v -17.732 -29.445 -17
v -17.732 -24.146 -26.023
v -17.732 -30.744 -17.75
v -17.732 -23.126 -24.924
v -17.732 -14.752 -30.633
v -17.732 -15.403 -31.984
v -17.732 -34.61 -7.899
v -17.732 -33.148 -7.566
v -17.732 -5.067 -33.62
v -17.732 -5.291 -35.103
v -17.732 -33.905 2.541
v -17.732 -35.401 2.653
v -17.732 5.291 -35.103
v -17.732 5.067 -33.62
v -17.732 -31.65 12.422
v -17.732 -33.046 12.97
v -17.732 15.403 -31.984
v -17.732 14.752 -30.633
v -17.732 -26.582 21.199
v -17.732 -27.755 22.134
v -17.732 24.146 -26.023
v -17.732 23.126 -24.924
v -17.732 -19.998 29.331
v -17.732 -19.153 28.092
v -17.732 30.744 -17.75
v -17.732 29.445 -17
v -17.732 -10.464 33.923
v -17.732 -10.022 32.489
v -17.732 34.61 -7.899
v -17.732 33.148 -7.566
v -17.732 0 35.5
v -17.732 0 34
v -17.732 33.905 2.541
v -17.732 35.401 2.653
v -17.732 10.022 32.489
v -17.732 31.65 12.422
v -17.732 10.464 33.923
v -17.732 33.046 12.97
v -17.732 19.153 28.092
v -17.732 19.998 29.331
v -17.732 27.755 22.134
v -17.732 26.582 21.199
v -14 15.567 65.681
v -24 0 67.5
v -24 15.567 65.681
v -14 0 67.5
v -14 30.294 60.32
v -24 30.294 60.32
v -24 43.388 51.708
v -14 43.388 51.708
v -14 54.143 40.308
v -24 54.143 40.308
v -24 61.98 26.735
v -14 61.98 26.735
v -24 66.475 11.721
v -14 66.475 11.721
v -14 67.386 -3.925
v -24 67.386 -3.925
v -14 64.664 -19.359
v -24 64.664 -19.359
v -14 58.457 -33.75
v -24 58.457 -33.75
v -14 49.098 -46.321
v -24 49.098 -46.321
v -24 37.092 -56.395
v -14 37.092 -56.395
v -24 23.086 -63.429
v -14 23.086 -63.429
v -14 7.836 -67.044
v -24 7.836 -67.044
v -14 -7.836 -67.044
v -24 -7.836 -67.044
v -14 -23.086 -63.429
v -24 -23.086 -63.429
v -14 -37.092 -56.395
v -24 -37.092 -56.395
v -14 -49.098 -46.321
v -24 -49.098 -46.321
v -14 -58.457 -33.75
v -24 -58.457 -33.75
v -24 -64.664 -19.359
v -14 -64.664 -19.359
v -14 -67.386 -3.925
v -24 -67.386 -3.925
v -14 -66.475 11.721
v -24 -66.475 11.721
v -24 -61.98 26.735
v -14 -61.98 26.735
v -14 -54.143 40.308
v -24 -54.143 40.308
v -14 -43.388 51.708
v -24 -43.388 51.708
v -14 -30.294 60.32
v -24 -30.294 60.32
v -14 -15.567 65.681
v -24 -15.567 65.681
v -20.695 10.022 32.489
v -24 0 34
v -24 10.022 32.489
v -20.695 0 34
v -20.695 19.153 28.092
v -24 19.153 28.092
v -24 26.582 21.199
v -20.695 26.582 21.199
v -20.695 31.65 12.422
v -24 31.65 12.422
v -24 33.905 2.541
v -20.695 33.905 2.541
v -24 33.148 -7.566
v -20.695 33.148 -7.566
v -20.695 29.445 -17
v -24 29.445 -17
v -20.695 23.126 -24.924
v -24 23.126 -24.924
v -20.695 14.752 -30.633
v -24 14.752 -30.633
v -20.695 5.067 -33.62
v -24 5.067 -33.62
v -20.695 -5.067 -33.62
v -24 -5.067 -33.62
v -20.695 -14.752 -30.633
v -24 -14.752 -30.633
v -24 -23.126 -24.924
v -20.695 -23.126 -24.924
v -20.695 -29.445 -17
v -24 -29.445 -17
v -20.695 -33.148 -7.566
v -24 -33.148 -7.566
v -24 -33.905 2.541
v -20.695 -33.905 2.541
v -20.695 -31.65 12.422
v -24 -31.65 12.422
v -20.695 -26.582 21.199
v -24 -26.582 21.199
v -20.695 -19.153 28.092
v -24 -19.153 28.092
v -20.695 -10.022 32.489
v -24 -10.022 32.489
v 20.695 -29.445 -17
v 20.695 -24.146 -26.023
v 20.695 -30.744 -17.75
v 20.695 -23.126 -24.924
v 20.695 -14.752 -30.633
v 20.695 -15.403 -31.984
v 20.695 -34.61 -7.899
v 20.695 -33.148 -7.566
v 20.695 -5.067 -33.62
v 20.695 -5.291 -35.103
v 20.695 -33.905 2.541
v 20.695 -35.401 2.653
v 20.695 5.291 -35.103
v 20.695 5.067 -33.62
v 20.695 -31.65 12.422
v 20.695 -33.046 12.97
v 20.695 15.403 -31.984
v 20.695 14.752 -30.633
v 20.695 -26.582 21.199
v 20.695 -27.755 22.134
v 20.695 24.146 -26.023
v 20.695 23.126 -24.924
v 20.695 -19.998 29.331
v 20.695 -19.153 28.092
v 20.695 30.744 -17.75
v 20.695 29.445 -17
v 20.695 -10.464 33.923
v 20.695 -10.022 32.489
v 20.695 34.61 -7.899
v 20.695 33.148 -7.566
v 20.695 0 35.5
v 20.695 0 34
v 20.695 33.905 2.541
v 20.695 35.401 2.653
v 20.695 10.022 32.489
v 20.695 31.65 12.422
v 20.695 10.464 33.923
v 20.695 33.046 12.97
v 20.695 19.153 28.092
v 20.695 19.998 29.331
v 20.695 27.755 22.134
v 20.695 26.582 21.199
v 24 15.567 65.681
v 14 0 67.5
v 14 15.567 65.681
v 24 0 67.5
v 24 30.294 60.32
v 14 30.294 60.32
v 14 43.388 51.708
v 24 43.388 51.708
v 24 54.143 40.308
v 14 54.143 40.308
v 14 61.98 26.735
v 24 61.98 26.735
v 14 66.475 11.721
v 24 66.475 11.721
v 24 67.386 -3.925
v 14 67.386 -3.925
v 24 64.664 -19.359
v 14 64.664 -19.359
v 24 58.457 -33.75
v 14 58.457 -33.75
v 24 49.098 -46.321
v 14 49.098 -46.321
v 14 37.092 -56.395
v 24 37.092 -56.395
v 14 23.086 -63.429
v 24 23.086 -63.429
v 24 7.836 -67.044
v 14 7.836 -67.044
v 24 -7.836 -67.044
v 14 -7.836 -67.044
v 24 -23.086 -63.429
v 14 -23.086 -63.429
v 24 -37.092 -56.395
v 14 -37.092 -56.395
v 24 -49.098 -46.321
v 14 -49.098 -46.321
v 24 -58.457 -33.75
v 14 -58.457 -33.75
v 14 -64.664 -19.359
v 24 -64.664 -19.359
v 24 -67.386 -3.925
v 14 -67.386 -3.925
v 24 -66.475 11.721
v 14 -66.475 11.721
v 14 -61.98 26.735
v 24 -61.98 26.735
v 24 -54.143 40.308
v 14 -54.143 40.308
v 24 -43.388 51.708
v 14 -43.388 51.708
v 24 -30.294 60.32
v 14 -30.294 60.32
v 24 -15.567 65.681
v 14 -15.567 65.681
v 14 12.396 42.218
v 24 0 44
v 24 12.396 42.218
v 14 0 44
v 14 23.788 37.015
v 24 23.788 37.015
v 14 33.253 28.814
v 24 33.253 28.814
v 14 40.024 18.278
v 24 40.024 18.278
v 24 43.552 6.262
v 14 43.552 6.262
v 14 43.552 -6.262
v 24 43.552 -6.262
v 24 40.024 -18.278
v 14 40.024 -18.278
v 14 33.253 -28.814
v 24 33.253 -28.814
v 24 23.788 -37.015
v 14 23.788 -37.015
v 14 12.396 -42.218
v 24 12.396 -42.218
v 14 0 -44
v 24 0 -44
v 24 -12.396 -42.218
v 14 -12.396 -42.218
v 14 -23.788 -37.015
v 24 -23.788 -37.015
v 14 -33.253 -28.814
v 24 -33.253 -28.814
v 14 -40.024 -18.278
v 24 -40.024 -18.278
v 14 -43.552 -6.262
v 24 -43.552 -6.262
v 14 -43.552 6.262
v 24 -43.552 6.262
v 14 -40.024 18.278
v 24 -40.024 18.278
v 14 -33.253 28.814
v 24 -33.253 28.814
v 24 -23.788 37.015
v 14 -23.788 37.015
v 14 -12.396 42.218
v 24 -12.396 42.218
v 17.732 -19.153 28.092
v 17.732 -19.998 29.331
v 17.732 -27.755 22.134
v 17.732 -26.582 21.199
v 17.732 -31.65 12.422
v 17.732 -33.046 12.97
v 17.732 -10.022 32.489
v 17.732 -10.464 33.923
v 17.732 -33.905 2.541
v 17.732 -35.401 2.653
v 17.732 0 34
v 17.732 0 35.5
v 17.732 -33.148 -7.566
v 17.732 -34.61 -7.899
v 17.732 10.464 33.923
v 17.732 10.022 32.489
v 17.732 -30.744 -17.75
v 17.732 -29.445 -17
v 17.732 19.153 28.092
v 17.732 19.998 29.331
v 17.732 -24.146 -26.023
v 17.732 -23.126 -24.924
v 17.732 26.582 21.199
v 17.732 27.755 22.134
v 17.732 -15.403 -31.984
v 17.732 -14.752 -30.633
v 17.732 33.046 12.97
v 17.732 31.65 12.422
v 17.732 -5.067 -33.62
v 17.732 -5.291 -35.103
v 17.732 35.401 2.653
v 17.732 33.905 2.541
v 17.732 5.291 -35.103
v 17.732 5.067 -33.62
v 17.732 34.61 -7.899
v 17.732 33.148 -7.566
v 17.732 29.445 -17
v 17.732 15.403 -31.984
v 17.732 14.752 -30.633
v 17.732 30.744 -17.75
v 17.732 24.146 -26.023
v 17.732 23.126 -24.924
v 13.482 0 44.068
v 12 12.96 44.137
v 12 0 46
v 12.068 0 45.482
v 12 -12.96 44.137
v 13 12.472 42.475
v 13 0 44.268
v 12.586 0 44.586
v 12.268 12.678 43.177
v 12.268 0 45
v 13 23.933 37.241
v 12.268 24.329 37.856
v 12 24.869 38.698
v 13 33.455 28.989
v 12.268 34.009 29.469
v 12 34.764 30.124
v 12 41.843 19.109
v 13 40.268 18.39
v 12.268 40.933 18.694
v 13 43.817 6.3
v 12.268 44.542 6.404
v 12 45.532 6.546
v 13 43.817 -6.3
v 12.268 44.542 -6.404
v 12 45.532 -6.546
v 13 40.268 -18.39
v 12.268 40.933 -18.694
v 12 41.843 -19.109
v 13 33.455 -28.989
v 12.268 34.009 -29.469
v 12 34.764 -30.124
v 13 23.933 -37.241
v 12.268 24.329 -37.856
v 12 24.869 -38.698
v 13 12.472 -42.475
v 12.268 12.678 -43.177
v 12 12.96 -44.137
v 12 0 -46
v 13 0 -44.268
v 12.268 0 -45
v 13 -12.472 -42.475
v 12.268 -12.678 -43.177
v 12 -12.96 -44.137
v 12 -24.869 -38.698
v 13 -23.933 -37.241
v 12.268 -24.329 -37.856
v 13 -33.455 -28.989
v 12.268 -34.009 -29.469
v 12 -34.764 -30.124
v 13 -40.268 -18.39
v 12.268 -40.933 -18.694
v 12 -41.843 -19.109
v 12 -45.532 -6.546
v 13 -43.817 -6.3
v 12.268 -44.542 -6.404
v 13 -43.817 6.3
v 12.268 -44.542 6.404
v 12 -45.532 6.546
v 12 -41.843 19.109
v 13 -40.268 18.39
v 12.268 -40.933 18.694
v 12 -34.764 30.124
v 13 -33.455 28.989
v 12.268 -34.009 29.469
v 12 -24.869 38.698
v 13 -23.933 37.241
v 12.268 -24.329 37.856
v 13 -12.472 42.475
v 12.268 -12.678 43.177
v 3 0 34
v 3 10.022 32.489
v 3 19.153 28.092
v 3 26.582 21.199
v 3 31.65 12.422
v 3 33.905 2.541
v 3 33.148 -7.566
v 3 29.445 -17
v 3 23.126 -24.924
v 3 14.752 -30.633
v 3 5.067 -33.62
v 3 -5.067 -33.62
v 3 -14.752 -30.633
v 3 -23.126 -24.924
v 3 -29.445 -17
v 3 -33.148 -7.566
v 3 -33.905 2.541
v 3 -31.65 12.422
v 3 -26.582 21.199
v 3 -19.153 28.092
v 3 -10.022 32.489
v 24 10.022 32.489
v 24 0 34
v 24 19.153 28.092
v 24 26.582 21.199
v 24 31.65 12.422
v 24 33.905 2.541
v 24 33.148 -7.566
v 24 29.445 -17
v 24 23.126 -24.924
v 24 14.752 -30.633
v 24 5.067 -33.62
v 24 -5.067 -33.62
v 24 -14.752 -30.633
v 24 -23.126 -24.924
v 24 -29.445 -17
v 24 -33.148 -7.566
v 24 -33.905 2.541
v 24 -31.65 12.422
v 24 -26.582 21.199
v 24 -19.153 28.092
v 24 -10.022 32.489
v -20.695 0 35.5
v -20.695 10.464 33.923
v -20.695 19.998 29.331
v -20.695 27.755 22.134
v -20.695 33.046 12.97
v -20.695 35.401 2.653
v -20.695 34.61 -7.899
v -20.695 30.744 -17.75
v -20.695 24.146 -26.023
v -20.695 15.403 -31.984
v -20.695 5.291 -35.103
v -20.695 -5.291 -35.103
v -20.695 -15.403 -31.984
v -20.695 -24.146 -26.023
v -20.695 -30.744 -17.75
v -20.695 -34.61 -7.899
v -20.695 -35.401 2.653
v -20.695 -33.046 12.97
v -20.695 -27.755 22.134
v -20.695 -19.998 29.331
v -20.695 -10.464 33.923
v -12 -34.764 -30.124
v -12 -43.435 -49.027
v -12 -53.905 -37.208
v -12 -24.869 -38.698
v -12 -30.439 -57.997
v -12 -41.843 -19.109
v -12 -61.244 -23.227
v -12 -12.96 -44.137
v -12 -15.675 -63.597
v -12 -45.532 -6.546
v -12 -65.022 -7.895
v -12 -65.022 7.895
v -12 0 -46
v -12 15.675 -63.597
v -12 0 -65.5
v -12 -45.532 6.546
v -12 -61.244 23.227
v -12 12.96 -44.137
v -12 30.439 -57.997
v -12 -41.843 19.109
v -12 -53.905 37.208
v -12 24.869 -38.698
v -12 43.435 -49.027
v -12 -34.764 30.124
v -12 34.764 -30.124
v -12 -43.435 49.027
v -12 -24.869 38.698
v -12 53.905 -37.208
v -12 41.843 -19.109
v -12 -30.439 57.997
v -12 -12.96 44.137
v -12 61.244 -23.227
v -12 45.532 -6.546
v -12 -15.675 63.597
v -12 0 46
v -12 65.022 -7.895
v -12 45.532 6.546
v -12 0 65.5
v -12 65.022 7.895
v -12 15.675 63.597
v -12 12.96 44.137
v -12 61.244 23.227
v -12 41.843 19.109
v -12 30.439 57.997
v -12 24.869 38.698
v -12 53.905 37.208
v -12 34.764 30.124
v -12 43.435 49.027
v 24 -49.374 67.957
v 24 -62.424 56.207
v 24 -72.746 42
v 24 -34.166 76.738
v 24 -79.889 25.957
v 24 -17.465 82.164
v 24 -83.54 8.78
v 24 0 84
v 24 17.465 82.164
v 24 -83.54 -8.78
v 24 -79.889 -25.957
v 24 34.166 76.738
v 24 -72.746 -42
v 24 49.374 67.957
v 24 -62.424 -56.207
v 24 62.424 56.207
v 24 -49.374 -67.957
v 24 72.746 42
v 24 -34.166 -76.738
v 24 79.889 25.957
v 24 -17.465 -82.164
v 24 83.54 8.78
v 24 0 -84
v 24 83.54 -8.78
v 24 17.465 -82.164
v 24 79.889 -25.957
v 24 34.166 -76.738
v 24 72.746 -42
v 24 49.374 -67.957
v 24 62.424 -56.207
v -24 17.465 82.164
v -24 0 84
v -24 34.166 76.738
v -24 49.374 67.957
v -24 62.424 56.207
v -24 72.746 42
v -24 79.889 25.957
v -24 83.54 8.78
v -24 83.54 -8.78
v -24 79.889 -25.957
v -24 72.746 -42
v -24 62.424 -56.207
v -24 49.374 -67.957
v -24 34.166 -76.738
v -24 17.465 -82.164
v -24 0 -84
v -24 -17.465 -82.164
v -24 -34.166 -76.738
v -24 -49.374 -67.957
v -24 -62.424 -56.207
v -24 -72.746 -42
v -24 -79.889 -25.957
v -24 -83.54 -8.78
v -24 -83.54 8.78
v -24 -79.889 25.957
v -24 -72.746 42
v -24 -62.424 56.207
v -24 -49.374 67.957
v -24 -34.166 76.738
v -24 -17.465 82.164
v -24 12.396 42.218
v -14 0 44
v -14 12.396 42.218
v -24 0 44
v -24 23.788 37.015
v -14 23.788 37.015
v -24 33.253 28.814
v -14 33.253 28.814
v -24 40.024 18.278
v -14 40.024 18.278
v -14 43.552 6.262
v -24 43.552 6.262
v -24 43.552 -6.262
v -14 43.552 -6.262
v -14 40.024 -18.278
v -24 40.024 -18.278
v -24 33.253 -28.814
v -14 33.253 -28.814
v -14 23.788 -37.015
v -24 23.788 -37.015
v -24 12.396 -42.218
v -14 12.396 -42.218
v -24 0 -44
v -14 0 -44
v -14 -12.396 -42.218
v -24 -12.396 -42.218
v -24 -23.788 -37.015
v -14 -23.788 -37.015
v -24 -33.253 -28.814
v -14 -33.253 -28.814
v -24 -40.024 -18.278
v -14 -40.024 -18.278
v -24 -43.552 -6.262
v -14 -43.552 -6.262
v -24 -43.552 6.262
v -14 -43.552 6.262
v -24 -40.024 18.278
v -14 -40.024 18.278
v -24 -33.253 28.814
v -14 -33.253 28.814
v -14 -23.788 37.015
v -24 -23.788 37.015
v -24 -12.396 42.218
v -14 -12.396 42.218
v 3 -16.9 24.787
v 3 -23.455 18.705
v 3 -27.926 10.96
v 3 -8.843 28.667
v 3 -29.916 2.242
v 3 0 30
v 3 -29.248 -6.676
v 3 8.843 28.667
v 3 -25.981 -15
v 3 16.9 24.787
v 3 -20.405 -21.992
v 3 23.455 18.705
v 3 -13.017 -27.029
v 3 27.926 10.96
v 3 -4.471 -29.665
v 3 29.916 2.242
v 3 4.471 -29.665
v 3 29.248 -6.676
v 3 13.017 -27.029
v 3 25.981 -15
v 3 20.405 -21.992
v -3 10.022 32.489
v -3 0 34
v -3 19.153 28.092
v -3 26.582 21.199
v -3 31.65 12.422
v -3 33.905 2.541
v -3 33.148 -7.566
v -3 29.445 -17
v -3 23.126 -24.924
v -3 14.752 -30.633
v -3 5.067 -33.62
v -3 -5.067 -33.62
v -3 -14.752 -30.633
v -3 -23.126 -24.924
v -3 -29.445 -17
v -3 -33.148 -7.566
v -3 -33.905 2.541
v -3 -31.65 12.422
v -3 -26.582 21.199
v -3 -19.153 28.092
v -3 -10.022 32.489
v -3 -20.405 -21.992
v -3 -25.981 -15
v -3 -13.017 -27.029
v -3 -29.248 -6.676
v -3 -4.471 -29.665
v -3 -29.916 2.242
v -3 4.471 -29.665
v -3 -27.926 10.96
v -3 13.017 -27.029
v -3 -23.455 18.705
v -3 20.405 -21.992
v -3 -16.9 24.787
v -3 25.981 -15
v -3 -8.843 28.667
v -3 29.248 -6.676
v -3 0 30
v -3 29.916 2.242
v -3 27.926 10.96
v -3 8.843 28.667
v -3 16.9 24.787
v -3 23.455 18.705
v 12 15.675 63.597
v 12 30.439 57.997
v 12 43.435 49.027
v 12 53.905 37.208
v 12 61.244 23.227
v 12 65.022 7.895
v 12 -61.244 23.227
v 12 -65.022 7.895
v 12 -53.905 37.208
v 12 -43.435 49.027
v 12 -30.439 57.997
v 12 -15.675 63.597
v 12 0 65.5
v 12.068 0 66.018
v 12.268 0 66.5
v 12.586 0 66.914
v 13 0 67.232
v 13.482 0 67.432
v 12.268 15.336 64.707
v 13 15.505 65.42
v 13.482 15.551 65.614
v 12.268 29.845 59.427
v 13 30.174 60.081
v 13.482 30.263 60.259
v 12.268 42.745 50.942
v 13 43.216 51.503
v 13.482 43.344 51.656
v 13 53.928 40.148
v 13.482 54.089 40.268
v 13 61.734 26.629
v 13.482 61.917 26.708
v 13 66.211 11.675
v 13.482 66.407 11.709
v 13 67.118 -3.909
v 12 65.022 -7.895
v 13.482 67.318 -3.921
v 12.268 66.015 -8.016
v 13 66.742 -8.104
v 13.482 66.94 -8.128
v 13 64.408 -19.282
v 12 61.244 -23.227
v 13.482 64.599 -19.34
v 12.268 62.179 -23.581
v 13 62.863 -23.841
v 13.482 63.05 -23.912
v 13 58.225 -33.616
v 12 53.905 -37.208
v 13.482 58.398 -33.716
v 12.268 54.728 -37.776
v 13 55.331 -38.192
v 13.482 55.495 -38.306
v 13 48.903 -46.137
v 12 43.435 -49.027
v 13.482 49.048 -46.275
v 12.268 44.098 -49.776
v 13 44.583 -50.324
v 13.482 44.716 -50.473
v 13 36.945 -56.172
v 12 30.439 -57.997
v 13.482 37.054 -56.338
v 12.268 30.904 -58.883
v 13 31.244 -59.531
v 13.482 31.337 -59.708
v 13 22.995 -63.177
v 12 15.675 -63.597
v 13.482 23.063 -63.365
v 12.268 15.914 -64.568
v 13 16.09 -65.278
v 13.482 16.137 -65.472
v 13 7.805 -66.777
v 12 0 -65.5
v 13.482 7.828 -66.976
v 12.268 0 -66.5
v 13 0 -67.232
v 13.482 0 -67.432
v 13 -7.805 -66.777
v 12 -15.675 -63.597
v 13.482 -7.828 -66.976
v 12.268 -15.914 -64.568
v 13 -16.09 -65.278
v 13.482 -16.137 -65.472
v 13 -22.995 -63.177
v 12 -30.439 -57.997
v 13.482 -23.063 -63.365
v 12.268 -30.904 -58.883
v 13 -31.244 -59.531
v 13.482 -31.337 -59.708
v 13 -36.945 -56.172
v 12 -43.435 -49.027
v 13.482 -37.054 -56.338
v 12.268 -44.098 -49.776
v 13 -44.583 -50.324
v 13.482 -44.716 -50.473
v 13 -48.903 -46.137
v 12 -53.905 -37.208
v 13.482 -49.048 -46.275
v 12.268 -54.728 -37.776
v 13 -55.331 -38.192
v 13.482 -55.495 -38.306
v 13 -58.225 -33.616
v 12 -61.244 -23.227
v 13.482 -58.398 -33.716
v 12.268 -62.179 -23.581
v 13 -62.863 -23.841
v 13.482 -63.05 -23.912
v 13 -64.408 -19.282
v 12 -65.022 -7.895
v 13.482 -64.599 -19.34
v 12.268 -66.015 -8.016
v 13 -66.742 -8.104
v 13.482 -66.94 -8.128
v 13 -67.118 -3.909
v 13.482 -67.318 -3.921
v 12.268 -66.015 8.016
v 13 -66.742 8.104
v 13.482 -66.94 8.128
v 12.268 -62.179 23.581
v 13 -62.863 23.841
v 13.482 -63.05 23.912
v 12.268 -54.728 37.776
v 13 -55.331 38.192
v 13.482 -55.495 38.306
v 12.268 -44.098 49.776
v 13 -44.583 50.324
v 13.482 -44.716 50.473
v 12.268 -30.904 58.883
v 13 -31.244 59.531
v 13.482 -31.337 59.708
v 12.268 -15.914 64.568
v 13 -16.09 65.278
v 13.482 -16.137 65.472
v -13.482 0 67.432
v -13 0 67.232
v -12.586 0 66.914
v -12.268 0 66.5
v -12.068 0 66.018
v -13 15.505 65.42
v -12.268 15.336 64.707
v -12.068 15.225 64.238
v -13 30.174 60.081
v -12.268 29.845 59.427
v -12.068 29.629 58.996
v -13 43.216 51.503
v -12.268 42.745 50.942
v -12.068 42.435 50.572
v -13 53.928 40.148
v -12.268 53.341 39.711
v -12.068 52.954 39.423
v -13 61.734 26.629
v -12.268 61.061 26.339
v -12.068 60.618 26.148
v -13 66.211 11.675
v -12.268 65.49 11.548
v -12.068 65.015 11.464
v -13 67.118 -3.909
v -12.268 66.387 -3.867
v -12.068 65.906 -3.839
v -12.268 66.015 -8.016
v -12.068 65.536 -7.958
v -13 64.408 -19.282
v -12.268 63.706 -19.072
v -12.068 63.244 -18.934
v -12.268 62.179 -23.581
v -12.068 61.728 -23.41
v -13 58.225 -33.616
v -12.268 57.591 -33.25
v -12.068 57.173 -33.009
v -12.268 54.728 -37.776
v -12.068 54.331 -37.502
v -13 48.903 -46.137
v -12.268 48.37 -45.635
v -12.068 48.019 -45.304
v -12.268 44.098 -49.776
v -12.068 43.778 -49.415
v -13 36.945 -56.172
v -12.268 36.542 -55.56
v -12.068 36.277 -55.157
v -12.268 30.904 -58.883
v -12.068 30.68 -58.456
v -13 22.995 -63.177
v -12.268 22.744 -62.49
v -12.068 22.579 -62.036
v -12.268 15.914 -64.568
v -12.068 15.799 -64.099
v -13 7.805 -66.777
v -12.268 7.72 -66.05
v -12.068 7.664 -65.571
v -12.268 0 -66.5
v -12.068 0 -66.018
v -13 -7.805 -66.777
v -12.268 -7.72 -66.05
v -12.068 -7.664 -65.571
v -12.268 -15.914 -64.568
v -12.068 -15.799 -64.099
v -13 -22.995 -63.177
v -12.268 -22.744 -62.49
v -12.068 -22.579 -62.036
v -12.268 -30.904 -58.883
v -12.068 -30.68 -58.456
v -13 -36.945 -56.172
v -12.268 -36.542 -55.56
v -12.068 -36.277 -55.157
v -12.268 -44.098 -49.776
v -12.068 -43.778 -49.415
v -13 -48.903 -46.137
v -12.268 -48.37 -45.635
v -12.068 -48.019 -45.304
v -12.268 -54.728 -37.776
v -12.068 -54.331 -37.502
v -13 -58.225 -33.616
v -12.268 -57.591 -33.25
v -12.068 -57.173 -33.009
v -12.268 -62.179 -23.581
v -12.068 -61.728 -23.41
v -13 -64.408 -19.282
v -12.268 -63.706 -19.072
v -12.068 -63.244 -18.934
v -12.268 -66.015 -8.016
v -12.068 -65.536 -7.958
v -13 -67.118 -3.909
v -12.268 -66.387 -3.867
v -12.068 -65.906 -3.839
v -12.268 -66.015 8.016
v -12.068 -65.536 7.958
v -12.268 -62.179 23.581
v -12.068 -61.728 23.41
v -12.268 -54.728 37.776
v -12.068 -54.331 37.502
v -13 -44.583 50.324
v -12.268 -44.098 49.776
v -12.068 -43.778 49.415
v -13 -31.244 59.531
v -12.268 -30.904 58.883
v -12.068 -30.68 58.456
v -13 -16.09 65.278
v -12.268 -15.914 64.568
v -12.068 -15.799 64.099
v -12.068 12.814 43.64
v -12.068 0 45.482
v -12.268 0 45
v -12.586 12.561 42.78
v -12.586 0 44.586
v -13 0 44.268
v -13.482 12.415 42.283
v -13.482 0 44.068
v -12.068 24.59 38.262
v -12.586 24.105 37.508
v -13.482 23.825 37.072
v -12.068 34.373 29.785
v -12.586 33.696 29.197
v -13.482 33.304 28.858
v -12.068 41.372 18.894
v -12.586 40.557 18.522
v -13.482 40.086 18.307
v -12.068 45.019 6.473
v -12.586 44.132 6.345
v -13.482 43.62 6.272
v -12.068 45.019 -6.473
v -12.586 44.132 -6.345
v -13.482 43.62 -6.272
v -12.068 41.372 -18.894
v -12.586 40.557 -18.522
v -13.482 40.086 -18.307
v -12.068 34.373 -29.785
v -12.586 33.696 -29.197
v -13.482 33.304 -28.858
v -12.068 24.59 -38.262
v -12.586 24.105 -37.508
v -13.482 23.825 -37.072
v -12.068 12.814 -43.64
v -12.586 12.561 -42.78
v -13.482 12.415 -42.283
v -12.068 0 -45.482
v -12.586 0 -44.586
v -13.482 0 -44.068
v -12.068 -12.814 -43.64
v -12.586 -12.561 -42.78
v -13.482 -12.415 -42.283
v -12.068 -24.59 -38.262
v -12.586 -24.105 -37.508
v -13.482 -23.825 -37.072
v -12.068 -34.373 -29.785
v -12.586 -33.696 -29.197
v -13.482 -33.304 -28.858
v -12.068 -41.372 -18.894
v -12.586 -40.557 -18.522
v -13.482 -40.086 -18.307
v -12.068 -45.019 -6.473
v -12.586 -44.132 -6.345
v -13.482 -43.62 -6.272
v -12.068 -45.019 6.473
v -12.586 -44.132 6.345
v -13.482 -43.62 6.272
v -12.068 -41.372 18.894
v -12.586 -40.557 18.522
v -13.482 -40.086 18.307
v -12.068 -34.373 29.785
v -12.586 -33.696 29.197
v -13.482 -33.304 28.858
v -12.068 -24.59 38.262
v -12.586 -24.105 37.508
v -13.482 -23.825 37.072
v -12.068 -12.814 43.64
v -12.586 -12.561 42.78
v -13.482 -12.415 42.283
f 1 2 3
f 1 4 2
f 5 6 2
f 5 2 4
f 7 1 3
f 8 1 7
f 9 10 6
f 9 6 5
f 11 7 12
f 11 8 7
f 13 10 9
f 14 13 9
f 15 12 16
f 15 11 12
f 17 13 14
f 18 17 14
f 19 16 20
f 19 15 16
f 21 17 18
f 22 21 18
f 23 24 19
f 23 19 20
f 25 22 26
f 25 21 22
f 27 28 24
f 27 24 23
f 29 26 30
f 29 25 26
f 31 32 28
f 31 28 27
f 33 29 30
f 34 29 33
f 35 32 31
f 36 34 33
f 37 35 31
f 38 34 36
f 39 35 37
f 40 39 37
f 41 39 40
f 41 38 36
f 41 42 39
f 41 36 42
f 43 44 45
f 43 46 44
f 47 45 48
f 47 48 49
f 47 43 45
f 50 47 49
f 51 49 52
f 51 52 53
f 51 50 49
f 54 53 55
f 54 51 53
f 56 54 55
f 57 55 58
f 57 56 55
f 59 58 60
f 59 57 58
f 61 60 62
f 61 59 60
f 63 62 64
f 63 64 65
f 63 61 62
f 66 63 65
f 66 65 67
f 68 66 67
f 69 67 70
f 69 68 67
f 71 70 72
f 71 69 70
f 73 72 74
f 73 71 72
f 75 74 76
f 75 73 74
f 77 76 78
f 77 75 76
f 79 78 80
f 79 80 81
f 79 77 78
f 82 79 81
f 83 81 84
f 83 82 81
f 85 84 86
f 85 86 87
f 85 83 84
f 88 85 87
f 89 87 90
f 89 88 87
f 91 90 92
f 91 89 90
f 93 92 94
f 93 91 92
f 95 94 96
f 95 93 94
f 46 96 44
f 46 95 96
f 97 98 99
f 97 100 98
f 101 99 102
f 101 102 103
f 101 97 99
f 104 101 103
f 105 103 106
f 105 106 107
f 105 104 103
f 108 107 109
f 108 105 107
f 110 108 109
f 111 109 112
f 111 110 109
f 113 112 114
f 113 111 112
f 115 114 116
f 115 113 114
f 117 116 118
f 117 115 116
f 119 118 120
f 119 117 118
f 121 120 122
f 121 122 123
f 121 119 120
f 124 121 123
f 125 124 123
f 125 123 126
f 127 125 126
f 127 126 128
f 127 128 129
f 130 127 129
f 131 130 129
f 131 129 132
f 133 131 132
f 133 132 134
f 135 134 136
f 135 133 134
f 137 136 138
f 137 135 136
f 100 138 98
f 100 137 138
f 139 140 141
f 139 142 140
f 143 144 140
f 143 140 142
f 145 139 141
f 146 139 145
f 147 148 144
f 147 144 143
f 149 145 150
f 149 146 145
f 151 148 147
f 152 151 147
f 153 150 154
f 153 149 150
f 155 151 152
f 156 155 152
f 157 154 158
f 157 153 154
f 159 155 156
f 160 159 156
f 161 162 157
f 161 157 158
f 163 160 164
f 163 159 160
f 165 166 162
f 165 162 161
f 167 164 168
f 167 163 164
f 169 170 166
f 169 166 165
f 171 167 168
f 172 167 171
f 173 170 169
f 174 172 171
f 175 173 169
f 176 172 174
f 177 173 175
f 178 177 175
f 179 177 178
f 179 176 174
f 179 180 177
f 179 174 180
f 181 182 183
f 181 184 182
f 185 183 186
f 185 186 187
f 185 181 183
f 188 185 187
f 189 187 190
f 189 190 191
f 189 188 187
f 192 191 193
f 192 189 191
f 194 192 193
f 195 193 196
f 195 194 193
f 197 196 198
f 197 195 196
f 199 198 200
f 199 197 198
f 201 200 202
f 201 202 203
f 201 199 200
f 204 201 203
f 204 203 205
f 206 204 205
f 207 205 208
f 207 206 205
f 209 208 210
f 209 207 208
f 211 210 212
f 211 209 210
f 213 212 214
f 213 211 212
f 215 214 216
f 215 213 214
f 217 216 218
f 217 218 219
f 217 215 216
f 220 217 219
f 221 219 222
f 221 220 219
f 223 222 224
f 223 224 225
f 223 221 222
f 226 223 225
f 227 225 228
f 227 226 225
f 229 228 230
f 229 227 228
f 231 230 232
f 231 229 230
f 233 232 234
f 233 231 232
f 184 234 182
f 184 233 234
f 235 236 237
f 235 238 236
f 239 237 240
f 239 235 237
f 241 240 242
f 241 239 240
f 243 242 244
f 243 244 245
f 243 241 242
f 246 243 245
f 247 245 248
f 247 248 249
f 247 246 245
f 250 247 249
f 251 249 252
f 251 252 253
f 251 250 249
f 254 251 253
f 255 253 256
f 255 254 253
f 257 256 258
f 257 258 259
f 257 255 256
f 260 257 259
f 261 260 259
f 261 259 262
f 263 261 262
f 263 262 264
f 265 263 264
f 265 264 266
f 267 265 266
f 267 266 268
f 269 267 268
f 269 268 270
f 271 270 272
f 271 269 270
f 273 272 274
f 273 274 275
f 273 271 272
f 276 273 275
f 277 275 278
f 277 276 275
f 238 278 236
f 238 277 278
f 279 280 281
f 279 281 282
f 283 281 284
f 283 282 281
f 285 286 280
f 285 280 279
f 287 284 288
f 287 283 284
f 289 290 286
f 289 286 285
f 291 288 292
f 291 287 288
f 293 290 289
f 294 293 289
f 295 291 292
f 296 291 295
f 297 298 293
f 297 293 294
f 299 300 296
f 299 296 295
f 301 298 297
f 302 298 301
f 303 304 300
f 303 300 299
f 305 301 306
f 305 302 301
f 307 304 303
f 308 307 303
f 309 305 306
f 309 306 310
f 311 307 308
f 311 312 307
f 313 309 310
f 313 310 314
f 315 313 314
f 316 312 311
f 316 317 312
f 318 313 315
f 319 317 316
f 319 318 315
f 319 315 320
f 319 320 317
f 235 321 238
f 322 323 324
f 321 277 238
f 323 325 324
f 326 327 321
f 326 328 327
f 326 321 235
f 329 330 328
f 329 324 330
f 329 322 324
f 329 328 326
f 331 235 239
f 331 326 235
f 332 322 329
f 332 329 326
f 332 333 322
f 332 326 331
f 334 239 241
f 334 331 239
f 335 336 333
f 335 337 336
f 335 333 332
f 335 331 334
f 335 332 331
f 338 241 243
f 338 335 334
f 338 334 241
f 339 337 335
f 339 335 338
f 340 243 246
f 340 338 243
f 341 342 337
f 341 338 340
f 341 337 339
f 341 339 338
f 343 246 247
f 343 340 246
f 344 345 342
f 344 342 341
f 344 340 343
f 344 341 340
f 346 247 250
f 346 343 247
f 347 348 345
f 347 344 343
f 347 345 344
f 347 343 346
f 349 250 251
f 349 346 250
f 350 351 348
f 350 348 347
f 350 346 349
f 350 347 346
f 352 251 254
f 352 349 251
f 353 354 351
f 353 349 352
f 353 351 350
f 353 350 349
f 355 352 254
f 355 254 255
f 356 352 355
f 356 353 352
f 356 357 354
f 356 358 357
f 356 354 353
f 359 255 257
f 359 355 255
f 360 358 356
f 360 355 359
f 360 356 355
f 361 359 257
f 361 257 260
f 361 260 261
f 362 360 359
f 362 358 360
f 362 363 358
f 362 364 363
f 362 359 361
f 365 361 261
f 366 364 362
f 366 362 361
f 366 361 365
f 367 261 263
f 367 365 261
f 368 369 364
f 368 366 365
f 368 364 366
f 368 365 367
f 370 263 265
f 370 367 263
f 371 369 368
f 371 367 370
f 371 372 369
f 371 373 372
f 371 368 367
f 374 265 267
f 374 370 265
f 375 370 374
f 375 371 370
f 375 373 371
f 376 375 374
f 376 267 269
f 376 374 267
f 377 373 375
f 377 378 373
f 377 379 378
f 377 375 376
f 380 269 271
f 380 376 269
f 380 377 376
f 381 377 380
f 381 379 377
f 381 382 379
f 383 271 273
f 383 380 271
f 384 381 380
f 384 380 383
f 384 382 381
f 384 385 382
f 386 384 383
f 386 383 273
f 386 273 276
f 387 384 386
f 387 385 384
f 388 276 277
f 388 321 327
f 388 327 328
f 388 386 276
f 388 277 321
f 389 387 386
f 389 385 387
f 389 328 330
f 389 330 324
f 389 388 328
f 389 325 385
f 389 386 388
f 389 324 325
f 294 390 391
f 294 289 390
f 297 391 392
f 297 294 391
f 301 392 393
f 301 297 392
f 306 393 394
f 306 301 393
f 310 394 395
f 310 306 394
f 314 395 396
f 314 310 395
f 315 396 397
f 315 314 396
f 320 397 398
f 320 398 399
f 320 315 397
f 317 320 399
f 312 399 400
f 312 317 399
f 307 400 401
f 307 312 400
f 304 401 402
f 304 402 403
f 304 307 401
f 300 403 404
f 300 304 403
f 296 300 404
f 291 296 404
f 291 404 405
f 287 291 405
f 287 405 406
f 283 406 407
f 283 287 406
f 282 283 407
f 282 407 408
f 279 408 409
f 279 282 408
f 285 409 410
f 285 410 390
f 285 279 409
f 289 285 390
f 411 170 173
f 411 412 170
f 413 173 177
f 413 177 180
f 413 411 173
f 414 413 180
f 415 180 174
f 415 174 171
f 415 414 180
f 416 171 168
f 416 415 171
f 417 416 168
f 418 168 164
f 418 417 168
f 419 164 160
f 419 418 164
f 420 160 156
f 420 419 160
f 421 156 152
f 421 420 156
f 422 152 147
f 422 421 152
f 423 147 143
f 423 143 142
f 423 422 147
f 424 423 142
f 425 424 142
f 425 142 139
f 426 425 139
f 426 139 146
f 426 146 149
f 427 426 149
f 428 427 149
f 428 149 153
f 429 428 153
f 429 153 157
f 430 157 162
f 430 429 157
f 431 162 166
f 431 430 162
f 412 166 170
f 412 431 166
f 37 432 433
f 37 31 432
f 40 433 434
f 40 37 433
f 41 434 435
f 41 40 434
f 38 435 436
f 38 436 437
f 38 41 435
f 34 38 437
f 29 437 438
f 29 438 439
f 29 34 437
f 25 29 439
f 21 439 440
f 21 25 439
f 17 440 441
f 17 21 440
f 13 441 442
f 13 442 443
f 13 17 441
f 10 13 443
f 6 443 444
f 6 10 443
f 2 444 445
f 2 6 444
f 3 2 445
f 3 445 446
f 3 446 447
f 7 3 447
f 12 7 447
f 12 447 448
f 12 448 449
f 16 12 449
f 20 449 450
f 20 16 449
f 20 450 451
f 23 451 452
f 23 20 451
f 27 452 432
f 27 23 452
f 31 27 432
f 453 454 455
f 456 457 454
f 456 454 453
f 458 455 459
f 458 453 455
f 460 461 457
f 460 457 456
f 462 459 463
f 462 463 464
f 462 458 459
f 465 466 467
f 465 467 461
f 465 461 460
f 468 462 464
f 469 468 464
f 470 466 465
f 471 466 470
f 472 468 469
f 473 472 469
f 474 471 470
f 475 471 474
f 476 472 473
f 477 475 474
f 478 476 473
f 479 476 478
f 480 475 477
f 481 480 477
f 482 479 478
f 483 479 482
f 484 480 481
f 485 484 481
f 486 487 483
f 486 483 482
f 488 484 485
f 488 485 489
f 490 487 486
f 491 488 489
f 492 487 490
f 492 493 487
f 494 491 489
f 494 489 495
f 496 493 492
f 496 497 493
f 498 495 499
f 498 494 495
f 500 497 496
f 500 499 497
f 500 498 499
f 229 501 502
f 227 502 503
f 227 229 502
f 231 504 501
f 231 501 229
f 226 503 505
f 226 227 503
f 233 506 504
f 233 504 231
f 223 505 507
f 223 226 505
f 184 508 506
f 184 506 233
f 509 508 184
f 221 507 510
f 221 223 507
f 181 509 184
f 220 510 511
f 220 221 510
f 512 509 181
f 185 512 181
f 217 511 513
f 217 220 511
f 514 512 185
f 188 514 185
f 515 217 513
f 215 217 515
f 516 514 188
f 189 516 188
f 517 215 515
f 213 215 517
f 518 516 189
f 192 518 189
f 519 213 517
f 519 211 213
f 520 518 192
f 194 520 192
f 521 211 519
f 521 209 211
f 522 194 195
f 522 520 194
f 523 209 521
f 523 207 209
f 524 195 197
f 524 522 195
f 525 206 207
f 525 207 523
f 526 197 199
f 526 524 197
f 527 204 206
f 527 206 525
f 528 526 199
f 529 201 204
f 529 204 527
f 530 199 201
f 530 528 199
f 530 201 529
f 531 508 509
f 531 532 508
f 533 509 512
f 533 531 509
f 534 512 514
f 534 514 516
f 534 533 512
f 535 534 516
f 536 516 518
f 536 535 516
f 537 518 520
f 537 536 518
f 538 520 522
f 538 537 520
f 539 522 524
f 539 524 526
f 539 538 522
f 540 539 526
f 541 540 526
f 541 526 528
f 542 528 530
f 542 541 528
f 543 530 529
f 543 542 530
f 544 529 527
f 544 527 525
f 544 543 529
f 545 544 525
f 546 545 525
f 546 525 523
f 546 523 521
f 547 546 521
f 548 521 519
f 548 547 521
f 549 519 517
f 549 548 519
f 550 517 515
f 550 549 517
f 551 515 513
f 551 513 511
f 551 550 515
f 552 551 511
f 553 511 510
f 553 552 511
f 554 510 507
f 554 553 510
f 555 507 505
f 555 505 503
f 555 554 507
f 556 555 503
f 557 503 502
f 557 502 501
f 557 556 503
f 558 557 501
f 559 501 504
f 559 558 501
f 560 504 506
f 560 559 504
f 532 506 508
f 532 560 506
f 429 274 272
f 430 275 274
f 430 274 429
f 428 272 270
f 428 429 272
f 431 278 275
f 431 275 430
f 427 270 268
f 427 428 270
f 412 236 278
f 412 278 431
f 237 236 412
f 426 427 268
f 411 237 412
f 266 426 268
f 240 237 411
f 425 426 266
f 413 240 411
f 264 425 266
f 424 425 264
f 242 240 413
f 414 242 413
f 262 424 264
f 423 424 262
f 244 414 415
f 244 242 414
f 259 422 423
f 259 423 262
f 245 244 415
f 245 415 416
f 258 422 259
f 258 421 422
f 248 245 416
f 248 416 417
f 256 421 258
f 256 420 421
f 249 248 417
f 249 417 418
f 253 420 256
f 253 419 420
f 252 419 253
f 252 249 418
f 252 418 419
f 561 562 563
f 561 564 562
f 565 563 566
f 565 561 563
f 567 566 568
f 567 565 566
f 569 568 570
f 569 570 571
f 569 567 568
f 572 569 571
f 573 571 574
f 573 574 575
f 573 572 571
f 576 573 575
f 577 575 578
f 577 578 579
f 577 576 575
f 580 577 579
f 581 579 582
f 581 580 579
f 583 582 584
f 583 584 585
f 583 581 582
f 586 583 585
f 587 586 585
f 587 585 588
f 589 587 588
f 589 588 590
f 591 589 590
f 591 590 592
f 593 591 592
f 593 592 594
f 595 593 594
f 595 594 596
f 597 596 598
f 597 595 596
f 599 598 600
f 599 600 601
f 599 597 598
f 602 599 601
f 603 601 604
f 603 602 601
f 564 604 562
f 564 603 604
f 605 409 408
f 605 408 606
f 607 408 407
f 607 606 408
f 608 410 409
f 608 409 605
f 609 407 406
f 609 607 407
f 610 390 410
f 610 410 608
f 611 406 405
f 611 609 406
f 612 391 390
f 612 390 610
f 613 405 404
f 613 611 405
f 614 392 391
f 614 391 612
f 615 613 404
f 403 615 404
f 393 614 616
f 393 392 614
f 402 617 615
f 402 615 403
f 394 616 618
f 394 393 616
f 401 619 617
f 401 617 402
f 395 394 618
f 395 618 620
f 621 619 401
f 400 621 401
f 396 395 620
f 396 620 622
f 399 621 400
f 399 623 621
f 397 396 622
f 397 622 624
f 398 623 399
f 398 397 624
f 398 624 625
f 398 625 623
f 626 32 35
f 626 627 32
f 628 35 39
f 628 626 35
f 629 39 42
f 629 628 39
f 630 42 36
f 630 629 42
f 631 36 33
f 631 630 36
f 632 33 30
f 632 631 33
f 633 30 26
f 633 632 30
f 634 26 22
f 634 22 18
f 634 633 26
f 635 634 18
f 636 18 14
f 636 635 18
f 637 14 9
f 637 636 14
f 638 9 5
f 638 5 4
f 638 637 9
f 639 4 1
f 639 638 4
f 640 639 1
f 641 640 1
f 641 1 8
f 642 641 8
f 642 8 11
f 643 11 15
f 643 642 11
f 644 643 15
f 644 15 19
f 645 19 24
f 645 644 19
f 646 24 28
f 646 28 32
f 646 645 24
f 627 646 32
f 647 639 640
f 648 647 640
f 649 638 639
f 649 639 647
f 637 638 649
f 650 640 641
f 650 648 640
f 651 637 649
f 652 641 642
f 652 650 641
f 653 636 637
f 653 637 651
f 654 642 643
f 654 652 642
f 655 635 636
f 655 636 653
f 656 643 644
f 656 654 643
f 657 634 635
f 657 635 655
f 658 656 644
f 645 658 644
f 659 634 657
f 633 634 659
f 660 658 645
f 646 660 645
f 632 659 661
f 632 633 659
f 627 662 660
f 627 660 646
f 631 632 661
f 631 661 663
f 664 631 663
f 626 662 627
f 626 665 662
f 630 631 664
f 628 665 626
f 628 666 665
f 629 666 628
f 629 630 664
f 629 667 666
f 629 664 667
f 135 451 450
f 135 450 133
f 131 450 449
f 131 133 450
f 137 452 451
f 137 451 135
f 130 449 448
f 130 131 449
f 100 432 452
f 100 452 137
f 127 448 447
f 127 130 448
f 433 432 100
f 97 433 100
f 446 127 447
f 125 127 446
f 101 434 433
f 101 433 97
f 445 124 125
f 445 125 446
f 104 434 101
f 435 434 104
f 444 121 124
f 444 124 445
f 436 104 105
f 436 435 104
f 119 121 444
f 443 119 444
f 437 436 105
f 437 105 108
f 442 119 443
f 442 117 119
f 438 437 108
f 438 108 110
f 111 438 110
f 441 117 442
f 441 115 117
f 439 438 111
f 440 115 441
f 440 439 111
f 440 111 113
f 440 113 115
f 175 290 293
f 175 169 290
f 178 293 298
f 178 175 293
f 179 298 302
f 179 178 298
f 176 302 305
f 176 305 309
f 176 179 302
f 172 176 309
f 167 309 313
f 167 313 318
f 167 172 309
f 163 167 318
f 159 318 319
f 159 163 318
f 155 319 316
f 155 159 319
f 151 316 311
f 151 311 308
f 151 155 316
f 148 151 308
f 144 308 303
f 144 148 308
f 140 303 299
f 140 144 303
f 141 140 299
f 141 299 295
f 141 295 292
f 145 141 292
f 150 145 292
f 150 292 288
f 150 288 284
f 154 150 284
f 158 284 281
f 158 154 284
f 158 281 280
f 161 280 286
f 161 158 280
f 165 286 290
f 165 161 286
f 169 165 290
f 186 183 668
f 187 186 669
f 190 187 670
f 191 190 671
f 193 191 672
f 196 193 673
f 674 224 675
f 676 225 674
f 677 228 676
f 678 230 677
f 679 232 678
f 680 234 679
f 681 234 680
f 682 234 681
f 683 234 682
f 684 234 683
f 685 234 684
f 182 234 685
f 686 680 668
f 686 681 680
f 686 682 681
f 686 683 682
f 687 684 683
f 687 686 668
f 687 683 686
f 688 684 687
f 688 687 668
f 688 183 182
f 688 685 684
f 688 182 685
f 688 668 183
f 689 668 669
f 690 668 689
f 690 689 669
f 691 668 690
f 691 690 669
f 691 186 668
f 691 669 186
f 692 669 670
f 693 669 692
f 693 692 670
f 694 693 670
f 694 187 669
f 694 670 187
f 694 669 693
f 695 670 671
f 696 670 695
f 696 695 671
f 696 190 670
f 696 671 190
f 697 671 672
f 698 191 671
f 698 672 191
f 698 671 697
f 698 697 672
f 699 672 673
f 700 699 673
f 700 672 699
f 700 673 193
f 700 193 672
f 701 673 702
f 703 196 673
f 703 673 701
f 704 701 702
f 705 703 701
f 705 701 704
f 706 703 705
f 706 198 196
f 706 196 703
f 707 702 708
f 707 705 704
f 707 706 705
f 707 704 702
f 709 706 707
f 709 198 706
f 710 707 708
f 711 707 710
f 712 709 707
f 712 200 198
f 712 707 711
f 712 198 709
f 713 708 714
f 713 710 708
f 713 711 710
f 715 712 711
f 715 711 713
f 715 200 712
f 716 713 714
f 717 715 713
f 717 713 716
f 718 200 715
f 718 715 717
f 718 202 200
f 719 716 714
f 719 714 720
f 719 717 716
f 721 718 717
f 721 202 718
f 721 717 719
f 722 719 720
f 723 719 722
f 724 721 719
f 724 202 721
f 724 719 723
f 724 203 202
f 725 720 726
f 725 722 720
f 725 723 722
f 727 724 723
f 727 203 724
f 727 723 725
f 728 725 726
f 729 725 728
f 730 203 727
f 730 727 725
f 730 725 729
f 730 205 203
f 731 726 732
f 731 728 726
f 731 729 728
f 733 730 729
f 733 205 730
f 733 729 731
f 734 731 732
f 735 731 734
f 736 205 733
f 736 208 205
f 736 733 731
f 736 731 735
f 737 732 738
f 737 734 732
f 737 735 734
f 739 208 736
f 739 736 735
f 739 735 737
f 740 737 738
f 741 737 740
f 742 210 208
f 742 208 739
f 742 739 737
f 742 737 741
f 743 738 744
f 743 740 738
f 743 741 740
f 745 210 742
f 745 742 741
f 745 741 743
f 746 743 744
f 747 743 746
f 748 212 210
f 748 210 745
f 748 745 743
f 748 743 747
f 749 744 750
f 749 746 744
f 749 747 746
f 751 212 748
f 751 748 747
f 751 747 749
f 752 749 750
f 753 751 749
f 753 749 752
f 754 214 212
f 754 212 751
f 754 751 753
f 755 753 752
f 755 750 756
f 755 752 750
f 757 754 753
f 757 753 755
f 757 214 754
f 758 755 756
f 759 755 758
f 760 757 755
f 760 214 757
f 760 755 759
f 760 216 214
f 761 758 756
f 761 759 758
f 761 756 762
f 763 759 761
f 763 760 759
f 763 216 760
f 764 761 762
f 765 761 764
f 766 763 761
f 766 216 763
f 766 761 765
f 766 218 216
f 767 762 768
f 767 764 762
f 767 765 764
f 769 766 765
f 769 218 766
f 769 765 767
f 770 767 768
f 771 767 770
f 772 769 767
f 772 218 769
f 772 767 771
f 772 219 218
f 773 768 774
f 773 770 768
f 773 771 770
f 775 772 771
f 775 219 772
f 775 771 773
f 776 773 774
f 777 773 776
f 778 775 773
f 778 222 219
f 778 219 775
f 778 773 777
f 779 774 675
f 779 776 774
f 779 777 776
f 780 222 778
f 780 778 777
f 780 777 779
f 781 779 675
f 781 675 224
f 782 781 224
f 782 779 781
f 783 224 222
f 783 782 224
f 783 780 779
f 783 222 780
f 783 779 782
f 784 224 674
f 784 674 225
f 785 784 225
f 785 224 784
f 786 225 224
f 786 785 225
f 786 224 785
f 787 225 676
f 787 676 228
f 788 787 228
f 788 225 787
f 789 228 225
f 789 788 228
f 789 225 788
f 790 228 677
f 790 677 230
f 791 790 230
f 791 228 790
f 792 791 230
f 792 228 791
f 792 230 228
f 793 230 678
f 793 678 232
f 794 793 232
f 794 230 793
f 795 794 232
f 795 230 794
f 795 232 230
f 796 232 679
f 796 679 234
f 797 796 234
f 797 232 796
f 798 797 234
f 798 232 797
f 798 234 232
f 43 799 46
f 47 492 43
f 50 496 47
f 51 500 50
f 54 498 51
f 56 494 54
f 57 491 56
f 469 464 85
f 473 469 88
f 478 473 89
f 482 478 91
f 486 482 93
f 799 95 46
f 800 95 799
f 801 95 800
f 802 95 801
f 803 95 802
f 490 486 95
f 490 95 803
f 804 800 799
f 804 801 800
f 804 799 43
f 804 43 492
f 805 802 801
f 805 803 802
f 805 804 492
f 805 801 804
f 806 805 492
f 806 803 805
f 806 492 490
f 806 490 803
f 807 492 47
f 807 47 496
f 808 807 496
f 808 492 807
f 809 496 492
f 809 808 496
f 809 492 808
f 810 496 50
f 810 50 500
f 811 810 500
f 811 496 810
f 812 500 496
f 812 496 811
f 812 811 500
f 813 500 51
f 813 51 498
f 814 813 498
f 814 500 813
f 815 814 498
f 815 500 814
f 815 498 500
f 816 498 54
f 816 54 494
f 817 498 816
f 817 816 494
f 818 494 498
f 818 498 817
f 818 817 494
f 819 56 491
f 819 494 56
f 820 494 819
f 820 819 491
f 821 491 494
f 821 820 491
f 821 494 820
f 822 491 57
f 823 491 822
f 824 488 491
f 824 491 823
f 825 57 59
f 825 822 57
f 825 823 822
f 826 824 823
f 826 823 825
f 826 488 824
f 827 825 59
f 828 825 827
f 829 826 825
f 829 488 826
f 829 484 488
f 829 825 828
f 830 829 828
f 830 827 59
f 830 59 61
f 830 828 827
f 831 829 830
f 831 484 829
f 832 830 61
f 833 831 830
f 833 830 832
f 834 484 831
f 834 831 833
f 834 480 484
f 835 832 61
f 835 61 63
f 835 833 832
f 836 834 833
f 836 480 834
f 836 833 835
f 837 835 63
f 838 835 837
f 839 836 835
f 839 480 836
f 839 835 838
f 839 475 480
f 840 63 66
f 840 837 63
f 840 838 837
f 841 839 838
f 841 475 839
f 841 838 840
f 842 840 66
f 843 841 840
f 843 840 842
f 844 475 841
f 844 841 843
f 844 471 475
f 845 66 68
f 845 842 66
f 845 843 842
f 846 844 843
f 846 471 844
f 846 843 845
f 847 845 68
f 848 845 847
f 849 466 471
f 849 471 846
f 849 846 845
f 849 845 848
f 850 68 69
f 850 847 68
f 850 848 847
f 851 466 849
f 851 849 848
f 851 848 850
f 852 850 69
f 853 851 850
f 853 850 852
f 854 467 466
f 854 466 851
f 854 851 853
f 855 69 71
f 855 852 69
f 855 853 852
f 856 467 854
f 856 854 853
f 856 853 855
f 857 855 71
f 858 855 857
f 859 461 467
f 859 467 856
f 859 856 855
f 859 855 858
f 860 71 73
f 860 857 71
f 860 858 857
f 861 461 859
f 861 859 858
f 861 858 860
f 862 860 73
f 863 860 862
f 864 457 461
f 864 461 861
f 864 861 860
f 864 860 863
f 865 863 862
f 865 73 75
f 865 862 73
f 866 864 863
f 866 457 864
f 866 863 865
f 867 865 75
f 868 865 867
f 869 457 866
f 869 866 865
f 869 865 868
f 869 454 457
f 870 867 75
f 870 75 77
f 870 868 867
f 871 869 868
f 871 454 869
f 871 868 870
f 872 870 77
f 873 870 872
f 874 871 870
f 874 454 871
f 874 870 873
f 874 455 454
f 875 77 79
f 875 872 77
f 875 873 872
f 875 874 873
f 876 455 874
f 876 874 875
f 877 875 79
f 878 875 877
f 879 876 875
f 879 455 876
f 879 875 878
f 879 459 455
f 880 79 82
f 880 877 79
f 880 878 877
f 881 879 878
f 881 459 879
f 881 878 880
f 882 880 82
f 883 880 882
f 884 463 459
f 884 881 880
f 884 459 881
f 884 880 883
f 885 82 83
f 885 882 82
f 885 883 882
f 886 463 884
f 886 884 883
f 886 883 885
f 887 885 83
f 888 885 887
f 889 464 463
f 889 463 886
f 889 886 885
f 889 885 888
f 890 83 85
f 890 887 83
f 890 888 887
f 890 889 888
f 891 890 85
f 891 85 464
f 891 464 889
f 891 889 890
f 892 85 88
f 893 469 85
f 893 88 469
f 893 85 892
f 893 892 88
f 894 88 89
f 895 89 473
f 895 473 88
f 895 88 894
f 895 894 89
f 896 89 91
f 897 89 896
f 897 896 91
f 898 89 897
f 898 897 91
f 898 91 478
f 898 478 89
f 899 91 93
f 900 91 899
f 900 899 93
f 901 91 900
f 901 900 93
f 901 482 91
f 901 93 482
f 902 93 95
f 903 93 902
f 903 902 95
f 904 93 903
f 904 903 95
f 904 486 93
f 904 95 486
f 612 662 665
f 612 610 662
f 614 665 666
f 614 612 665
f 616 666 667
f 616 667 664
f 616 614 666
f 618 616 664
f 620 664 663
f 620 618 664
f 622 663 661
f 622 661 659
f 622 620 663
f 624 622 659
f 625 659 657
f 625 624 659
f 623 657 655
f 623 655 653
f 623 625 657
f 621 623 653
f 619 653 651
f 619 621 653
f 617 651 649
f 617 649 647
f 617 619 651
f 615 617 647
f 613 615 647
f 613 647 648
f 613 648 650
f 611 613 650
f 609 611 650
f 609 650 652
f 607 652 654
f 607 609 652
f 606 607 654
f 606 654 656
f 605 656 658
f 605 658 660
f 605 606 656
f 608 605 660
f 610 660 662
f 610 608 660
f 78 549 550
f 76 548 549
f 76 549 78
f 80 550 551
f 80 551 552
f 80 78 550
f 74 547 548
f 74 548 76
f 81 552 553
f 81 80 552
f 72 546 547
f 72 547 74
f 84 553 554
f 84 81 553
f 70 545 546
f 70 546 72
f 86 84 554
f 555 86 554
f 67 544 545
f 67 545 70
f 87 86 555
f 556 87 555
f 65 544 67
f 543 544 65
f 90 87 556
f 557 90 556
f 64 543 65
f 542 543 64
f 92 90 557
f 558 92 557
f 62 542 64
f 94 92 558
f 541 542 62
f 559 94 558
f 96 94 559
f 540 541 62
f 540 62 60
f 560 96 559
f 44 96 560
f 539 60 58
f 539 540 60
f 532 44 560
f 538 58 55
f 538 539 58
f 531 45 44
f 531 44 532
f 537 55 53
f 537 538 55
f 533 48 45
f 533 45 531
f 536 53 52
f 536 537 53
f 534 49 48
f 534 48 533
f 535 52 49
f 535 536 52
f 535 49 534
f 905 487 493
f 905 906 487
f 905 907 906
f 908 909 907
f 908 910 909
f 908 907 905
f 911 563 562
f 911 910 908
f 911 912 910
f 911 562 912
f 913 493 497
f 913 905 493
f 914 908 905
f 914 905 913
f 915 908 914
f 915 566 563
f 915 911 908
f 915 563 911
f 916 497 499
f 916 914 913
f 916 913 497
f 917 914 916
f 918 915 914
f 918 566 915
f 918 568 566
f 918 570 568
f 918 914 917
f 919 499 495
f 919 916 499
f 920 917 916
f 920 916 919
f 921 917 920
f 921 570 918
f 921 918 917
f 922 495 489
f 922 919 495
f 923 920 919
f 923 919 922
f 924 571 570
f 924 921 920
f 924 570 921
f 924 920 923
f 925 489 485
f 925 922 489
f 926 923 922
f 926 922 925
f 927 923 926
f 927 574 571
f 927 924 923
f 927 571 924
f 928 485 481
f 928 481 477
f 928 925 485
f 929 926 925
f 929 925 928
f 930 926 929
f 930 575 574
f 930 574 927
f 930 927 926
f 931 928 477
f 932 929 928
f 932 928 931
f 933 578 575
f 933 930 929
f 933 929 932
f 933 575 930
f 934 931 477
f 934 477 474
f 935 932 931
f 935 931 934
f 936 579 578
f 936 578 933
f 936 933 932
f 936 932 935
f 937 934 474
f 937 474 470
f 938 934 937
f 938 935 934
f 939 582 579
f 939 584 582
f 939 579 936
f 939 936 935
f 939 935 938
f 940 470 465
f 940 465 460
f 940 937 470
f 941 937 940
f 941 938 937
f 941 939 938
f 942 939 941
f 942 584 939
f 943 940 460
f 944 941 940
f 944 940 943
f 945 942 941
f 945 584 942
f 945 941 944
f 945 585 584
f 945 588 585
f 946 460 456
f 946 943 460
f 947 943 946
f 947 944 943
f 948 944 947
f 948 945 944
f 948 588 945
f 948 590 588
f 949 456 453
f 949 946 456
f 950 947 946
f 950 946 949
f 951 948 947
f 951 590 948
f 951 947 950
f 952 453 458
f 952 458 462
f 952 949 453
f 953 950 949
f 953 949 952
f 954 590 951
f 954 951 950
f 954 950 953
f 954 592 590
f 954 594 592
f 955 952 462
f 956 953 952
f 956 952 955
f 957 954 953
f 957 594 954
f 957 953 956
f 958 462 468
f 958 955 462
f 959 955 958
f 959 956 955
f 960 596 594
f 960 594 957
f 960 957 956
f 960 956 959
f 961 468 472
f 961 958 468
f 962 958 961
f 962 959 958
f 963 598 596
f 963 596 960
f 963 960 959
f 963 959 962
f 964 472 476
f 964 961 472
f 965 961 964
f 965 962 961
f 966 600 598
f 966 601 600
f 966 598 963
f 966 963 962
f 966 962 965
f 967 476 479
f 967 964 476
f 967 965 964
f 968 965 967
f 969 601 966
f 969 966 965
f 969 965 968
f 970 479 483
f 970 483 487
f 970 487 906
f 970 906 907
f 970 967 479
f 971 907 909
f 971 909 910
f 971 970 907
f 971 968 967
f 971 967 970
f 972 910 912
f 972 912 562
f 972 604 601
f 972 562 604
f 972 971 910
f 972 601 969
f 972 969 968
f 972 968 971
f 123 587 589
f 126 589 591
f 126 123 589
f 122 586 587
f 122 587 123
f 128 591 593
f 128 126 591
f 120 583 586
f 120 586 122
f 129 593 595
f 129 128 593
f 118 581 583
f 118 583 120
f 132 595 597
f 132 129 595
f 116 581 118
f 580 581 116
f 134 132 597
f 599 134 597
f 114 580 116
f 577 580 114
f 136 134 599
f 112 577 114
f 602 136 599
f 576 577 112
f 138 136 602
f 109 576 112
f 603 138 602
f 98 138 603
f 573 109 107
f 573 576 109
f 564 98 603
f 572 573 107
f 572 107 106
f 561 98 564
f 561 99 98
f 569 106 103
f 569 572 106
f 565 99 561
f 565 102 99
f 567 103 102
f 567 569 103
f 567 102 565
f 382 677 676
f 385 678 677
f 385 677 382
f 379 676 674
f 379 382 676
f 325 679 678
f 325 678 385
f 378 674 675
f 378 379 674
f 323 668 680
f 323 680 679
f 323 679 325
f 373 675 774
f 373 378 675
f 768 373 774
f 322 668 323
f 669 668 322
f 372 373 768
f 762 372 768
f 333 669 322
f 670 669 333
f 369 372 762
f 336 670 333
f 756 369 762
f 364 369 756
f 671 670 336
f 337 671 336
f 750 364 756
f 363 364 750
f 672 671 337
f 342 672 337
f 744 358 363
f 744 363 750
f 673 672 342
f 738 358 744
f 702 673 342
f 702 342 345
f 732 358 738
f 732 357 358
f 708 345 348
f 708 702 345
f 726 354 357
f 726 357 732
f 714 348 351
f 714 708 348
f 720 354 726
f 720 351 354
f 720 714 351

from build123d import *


with BuildPart() as f1:
    # F0 (on Front) → F1 (revolve)
    with BuildSketch(Plane.XZ):
        with BuildLine():
            Line((0, 30), (0, 84))
            Line((0, 84), (-24, 84))
            Line((-24, 84), (-24, 67.5))
            Line((-24, 67.5), (-14, 67.5))
            ThreePointArc((-14, 67.5), (-12.585786, 66.914214), (-12, 65.5))
            Line((-12, 65.5), (-12, 46))
            ThreePointArc((-12, 46), (-12.585786, 44.585786), (-14, 44))
            Line((-14, 44), (-24, 44))
            Line((-24, 44), (-24, 34))
            Line((-24, 34), (-20.694984, 34))
            Line((-20.694984, 34), (-20.694984, 35.5))
            Line((-20.694984, 35.5), (-17.731871, 35.5))
            Line((-17.731871, 35.5), (-17.731871, 34))
            Line((-17.731871, 34), (-3, 34))
            Line((-3, 34), (-3, 30))
            Line((-3, 30), (0, 30))
        make_face()
        with BuildLine():
            Line((24, 84), (0, 84))
            Line((0, 84), (0, 30))
            Line((0, 30), (3, 30))
            Line((3, 30), (3, 34))
            Line((3, 34), (17.731871, 34))
            Line((17.731871, 34), (17.731871, 35.5))
            Line((17.731871, 35.5), (20.694984, 35.5))
            Line((20.694984, 35.5), (20.694984, 34))
            Line((20.694984, 34), (24, 34))
            Line((24, 34), (24, 44))
            Line((24, 44), (14, 44))
            ThreePointArc((14, 44), (12.585786, 44.585786), (12, 46))
            Line((12, 46), (12, 65.5))
            ThreePointArc((12, 65.5), (12.585786, 66.914214), (14, 67.5))
            Line((14, 67.5), (24, 67.5))
            Line((24, 67.5), (24, 84))
        make_face()
    revolve(axis=Axis((-12, 0, 0), (-1, 0, 0)))


solid = f1.part
